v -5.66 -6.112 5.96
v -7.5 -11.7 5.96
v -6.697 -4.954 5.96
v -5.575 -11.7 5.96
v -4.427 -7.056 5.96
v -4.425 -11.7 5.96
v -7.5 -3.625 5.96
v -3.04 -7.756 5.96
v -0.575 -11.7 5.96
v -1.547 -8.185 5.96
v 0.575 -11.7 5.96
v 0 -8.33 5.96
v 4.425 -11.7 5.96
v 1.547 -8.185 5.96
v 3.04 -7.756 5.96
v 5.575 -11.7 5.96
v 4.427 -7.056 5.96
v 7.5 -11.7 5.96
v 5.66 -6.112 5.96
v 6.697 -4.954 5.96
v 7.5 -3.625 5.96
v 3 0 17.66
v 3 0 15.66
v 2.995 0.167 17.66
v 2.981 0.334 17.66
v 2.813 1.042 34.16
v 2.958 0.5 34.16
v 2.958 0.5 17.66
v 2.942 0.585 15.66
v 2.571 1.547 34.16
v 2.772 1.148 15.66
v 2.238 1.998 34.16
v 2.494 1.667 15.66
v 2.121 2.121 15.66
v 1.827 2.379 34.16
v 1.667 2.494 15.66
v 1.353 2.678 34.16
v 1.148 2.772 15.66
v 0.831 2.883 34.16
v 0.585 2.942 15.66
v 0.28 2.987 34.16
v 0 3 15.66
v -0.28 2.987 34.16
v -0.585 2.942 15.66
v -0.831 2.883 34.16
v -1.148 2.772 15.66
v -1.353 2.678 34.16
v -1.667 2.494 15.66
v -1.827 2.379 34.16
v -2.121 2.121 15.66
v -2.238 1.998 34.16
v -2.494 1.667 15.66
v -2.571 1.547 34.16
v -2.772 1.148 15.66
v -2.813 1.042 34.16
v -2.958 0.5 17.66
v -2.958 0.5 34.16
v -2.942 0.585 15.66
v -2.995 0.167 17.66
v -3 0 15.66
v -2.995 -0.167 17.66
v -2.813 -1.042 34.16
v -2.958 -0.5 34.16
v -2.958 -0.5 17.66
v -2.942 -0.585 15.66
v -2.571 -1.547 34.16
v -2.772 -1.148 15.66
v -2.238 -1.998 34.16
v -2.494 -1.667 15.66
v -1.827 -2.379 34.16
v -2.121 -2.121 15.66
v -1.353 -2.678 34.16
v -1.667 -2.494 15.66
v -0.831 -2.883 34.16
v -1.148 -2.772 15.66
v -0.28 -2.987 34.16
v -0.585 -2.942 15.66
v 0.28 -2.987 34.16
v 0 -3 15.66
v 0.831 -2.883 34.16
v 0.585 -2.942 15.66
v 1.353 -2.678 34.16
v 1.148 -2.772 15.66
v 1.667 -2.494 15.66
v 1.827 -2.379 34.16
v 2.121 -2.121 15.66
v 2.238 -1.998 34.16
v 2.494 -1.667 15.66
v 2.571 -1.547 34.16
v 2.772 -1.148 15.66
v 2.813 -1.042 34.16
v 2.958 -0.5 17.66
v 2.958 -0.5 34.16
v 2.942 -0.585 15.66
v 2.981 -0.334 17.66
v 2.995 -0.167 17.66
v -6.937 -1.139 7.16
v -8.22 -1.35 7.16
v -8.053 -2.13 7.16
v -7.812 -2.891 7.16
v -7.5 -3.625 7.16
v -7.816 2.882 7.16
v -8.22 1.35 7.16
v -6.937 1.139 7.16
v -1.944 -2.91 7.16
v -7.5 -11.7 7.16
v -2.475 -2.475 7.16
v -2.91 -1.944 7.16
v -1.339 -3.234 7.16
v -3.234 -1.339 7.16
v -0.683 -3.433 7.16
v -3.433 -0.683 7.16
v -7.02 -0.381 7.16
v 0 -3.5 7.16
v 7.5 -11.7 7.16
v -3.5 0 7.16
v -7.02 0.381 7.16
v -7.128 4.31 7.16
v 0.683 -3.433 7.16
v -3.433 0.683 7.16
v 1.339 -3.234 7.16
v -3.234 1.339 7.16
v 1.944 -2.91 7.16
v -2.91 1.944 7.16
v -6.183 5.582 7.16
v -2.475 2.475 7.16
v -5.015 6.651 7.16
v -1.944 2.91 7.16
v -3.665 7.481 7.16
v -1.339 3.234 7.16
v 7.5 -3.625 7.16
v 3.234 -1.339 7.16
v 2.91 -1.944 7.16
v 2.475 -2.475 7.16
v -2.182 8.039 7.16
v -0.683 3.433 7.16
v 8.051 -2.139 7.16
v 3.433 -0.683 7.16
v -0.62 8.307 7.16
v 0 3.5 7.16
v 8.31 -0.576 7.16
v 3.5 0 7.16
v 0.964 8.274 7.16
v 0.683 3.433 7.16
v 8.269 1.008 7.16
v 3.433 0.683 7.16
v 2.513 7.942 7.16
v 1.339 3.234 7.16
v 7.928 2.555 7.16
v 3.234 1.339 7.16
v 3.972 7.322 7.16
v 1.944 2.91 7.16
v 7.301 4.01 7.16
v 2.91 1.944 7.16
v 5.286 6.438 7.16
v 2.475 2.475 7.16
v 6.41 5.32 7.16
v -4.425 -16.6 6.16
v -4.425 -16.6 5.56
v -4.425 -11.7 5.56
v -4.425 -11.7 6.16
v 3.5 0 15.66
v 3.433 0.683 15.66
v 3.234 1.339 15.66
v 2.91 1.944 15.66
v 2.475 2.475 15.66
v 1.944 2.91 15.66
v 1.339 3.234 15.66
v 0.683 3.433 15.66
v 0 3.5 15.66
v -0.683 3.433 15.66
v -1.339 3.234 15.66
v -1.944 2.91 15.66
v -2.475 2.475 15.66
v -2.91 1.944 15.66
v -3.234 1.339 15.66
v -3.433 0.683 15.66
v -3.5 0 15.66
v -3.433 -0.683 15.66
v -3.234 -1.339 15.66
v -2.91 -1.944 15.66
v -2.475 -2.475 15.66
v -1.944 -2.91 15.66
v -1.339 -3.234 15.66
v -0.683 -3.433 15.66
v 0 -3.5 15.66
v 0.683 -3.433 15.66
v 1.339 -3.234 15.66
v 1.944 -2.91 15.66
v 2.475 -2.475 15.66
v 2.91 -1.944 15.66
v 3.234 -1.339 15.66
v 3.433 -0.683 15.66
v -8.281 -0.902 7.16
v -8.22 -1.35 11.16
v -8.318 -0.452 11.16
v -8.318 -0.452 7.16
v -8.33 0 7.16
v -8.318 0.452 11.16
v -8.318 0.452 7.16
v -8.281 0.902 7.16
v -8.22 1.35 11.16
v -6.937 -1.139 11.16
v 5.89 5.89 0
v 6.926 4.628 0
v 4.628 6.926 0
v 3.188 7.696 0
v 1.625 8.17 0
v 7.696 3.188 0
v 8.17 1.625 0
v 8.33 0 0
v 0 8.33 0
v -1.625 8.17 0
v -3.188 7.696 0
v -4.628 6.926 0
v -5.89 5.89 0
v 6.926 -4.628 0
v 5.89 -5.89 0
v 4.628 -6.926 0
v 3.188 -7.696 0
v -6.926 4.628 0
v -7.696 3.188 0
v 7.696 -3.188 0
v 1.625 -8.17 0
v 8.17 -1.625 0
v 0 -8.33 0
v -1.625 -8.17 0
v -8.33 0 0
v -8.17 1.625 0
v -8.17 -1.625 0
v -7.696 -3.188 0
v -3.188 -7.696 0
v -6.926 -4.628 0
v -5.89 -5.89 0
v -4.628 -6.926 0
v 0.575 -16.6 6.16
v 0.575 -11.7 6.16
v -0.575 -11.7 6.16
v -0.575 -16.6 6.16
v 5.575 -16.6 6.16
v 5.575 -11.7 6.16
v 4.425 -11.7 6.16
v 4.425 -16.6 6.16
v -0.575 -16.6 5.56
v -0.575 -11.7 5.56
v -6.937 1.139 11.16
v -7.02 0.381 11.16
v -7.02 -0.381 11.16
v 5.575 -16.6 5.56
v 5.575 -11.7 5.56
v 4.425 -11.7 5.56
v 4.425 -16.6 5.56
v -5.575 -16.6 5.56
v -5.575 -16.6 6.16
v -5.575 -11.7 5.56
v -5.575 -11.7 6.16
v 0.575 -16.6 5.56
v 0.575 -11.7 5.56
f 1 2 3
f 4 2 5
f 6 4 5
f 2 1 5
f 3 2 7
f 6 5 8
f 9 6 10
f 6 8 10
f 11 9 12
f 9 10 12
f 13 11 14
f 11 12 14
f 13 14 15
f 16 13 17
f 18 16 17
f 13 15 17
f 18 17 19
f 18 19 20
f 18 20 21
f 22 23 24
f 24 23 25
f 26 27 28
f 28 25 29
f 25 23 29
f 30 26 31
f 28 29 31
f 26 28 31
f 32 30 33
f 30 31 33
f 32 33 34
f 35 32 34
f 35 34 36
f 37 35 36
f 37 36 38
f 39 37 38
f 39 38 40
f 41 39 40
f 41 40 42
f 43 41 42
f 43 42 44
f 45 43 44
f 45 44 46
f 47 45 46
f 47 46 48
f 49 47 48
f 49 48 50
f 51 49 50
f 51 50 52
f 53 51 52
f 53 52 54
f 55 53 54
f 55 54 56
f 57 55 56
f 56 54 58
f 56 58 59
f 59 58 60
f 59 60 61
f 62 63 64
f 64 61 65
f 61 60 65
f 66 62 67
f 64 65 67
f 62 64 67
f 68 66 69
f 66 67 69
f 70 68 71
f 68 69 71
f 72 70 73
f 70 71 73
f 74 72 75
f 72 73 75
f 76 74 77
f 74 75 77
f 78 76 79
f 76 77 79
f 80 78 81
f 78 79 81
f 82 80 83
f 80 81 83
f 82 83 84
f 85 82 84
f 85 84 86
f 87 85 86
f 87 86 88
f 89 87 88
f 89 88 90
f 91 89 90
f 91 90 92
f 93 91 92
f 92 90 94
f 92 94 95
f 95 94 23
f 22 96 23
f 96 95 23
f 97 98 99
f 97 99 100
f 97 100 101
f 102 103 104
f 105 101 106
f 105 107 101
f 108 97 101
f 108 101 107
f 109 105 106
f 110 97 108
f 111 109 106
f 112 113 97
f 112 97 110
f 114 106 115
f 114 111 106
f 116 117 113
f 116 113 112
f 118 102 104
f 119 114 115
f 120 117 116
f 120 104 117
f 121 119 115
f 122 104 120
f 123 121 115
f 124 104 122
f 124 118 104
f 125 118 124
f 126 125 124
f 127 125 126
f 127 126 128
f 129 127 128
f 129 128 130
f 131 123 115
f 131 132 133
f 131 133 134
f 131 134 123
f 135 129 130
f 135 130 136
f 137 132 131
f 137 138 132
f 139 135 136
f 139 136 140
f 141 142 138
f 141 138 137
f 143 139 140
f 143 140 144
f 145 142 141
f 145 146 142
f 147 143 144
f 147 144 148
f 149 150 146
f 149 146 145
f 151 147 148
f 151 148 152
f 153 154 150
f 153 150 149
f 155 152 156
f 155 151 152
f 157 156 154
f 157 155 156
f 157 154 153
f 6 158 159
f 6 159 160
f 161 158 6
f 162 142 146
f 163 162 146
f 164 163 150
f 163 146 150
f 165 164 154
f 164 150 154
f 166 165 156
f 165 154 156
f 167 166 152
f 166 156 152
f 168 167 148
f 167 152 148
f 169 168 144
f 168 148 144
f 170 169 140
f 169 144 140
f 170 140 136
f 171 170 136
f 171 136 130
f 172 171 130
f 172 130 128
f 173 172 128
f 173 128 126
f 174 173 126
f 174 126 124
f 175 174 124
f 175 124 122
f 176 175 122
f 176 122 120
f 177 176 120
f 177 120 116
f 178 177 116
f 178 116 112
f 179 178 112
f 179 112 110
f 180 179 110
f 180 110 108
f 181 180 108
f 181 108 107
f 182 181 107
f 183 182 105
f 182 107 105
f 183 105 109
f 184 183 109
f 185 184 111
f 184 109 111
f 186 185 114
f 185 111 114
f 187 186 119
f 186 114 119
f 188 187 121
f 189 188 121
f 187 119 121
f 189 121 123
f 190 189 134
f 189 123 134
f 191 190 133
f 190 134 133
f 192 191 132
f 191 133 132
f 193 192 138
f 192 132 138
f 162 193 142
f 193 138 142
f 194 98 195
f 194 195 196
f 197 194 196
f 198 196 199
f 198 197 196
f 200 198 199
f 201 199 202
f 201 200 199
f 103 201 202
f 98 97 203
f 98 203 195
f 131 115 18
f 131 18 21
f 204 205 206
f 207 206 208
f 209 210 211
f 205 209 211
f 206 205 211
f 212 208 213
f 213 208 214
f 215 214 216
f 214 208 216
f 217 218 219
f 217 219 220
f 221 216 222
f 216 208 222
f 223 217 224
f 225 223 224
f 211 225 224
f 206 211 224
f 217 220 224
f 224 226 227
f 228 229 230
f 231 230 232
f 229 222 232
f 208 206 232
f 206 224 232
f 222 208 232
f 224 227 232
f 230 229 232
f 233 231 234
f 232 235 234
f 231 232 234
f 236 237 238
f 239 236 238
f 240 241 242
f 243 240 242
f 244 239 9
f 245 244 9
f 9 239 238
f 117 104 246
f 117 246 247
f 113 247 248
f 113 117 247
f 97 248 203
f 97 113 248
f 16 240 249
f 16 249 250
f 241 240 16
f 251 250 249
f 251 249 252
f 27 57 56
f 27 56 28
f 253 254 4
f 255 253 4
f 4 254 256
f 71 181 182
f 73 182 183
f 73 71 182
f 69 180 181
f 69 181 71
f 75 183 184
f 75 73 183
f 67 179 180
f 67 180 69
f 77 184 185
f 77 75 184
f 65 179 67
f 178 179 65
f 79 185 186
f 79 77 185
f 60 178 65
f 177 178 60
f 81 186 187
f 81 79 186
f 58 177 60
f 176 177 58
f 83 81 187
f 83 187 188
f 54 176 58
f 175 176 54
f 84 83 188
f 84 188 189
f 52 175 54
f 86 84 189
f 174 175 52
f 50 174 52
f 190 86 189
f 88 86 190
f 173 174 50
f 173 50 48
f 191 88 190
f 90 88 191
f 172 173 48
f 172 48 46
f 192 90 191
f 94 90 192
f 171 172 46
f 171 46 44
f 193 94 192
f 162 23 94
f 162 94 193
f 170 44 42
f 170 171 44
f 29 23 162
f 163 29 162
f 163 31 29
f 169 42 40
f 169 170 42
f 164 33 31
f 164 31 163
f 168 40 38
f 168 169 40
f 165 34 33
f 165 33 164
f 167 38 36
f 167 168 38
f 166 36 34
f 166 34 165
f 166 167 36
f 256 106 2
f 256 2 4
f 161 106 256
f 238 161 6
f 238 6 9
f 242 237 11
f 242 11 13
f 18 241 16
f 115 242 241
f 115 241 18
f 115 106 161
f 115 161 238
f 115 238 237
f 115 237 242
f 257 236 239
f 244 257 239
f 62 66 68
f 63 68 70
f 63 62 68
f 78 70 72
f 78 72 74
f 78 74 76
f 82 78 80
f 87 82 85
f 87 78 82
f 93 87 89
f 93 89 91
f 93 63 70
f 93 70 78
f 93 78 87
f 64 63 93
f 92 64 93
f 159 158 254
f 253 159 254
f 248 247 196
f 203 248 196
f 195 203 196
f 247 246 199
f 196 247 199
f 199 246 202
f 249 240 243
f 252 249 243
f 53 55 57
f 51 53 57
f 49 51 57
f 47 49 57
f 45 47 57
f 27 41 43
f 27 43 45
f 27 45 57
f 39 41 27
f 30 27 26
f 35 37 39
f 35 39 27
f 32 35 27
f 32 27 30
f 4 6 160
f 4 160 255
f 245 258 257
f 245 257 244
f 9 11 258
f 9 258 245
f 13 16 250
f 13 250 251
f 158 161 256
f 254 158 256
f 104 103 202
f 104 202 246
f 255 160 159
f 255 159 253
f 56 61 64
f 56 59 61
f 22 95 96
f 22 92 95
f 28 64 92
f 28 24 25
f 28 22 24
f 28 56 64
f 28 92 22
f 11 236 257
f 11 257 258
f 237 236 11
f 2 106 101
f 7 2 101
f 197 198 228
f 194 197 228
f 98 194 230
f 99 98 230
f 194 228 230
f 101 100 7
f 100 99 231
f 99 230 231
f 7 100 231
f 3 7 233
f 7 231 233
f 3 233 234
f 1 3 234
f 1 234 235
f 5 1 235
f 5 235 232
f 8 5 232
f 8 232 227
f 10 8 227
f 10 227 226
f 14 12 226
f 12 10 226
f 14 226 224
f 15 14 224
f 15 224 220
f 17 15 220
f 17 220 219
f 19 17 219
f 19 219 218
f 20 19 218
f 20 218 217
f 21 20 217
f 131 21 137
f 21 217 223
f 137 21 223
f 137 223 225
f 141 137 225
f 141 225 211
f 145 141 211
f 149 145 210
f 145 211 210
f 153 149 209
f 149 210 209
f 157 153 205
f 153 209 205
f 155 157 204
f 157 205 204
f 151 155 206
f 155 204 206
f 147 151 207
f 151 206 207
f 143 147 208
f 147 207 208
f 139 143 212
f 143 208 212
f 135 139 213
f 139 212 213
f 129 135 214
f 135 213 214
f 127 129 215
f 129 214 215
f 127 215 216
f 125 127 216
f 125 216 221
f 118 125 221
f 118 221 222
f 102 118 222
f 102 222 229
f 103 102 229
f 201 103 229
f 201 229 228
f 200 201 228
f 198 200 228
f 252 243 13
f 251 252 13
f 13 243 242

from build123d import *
from build123d.topology import SkipClean

# Parameters (mm, degrees)
SKETCH1_R           = 8.33
BOSS_EXTRUDE1_DEPTH = 7.16
SKETCH2_R           = 3.5
BOSS_EXTRUDE2_DEPTH = 8.5
BOSS_EXTRUDE6_START = -8.5
SKETCH6_R           = 3
BOSS_EXTRUDE6_DEPTH = 27
SKETCH7_W           = 6
SKETCH7_H           = 1
CUT_EXTRUDE1_DEPTH  = 16.5
SKETCH3_W           = 15
SKETCH3_H           = 11.20454244
BOSS_EXTRUDE3_DEPTH = 1.2
BOSS_EXTRUDE4_START = -0.2
SKETCH4_W           = 1.15
SKETCH4_H           = 4.9
BOSS_EXTRUDE4_DEPTH = 0.6
LPATTERN1_COUNT     = 2
LPATTERN1_PITCH     = 5
LPATTERN1_COL_COUNT = 2
LPATTERN1_COL_PITCH = 5
BOSS_EXTRUDE5_DEPTH = 4


with BuildPart() as part:
    # Sketch1 → Boss-Extrude1 (new body)
    with BuildSketch(Plane.XY):
        with Locations(Location((0, 0, 0), (0, 0, 180))):
            Circle(SKETCH1_R)
    extrude(amount=BOSS_EXTRUDE1_DEPTH)

    # Sketch2 → Boss-Extrude2 (add)
    with BuildSketch(Plane.XY.offset(7.16)):
        Circle(SKETCH2_R)
    extrude(amount=BOSS_EXTRUDE2_DEPTH)

    # Sketch6 → Boss-Extrude6 (add)
    with BuildSketch(Plane.XY.offset(15.66).offset(BOSS_EXTRUDE6_START)):
        Circle(SKETCH6_R)
    extrude(amount=BOSS_EXTRUDE6_DEPTH)

    # Sketch7 → Cut-Extrude1 (cut)
    with BuildSketch(Plane.XY.offset(34.16)):
        Rectangle(SKETCH7_W, SKETCH7_H)
    extrude(amount=-CUT_EXTRUDE1_DEPTH, mode=Mode.SUBTRACT)

    # Sketch3 → Boss-Extrude3 (add)
    with BuildSketch(Plane.XY.offset(7.16)):
        with Locations((0, -6.09772878)):
            Rectangle(SKETCH3_W, SKETCH3_H)
    extrude(amount=-BOSS_EXTRUDE3_DEPTH)

    # Sketch4 → Boss-Extrude4 (add)
    with BuildSketch(Plane(origin=(0, 0, 5.96), x_dir=(-1, 0, 0), z_dir=(0, 0, -1)).offset(BOSS_EXTRUDE4_START)):
        with Locations((0, -14.15)):
            Rectangle(SKETCH4_W, SKETCH4_H)
    boss_extrude4 = extrude(amount=BOSS_EXTRUDE4_DEPTH)

    # LPattern1: Boss-Extrude4 ×2
    with Locations(*[(i * LPATTERN1_PITCH, 0, 0) for i in range(1, LPATTERN1_COUNT)]):
        add(boss_extrude4)

    # LPattern1 col: Boss-Extrude4 ×2
    with Locations(*[(-i * LPATTERN1_COL_PITCH, 0, 0) for i in range(1, LPATTERN1_COL_COUNT)]):
        add(boss_extrude4)

    # Sketch5 → Boss-Extrude5 (add)
    with SkipClean():  # the faces are left unmerged after this step: merging them gives an invalid solid
        with BuildSketch(Plane.XY.offset(7.16)):
            with BuildLine():
                Line((-8.219878345, 1.35), (-6.937064197, 1.139315726))
                ThreePointArc((-6.937064197, 1.139315726), (-7.03, 0), (-6.937064197, -1.139315726))
                Line((-6.937064197, -1.139315726), (-8.219878345, -1.35))
                ThreePointArc((-8.219878345, -1.35), (-8.33, 0), (-8.219878345, 1.35))
            make_face()
        extrude(amount=BOSS_EXTRUDE5_DEPTH)
    add(part.part.scale(1), mode=Mode.REPLACE)  # the faces are merged on a copy


solid = part.part
